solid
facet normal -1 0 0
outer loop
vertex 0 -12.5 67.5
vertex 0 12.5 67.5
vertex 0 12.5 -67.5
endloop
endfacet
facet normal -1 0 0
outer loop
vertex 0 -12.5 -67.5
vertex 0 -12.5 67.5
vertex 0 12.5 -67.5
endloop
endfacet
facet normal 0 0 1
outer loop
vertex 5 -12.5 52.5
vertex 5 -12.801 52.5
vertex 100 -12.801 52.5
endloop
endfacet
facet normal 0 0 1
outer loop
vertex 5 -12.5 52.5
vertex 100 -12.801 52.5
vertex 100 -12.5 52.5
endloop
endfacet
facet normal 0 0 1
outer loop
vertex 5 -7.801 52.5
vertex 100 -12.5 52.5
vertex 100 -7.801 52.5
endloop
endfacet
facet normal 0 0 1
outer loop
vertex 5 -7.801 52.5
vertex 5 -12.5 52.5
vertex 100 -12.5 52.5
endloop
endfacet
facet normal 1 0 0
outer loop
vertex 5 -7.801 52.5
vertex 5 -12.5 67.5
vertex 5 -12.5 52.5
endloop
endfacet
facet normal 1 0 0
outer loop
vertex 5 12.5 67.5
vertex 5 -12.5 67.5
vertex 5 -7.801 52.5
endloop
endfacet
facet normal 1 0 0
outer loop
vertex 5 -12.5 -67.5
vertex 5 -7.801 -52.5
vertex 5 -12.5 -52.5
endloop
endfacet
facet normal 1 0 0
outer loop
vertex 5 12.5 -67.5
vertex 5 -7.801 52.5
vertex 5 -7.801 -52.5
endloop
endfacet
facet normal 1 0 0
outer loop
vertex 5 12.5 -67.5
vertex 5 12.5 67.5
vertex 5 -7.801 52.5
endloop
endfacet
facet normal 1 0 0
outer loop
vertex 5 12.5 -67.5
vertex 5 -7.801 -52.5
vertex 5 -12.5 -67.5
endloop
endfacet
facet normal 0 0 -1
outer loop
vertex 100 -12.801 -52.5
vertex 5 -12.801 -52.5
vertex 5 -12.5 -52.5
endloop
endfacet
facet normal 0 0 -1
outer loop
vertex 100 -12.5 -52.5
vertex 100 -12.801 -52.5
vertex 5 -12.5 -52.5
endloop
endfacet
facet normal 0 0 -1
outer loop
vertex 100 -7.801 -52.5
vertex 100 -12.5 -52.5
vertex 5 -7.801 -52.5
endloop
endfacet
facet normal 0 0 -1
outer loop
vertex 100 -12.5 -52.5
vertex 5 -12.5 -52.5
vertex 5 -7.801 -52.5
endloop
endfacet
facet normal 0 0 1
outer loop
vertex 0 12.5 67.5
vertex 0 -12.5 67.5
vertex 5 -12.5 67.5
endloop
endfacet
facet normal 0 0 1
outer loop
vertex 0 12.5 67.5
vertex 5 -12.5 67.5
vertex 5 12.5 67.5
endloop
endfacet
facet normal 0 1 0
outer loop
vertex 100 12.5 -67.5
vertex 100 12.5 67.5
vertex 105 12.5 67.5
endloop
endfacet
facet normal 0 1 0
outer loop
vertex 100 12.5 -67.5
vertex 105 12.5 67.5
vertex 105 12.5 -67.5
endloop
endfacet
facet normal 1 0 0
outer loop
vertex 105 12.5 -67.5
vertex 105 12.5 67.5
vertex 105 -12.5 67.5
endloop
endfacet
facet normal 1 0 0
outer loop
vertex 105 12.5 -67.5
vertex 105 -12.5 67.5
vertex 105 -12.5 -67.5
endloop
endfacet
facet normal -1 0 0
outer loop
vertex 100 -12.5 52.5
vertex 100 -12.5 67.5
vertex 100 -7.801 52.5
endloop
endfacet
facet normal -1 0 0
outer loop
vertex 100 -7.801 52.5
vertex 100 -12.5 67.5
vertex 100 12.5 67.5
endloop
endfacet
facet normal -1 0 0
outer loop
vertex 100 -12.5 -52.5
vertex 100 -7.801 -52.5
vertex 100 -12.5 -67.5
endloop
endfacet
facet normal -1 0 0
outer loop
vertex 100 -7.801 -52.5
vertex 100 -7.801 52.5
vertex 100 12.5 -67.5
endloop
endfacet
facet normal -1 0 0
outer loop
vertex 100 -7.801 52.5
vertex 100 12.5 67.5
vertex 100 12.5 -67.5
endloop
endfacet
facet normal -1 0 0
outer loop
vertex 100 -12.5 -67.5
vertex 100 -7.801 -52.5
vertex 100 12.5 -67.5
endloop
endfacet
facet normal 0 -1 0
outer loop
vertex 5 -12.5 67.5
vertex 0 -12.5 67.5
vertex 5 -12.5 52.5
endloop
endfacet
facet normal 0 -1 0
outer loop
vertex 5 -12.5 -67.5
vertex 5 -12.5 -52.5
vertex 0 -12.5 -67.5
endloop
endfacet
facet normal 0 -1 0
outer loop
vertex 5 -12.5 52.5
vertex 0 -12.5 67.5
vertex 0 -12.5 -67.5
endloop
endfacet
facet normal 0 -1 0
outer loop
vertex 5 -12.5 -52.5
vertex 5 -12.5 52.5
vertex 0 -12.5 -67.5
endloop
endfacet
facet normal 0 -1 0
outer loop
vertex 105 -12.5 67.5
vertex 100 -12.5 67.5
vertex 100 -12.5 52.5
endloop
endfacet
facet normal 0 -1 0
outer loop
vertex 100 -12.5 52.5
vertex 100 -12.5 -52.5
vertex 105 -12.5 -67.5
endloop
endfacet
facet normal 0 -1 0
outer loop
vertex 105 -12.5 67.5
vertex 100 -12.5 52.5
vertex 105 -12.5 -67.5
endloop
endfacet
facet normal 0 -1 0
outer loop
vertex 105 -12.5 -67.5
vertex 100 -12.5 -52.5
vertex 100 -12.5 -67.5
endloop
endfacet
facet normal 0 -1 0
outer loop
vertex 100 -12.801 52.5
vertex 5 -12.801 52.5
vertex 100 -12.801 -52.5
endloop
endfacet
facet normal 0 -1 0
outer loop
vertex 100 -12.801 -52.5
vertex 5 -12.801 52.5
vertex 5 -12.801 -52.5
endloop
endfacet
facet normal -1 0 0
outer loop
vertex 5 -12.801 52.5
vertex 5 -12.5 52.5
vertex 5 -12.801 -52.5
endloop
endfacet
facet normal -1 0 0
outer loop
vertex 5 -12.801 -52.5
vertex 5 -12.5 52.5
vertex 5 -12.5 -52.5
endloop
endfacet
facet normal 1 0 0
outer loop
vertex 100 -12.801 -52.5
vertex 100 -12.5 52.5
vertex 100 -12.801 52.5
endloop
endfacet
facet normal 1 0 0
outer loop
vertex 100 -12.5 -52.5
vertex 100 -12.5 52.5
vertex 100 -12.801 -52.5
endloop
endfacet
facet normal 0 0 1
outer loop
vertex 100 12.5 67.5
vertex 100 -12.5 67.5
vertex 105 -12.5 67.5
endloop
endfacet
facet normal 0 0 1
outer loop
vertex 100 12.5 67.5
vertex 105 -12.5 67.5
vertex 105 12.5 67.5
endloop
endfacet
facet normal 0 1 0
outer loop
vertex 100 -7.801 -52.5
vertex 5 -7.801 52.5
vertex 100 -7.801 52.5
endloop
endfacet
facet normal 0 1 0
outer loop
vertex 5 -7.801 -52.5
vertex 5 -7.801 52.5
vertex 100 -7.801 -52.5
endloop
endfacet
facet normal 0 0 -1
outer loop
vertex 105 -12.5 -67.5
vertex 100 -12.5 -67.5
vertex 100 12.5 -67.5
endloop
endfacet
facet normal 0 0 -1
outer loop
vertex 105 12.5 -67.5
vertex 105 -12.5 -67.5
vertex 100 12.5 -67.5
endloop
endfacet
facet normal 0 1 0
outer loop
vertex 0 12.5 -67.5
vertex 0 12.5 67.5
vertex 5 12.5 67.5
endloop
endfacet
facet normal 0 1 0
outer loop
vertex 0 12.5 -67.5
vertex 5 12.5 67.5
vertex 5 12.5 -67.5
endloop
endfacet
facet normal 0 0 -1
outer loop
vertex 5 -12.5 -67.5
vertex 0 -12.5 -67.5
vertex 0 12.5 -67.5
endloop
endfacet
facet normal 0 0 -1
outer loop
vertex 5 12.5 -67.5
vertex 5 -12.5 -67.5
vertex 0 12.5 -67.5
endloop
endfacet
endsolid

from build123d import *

# Parameters (mm, degrees)
SKETCH_1_W      = 135
SKETCH_1_H      = 25
EXTRUDE_1_DEPTH = 5
SKETCH_3_W      = 105
SKETCH_3_H      = 5
EXTRUDE_2_DEPTH = 95
SKETCH_4_W      = 135
SKETCH_4_H      = 25
EXTRUDE_3_DEPTH = 5


with BuildPart() as part:
    # 草图1 → 凸台-拉伸1 (new body)
    with BuildSketch(Plane(origin=(0, 0, 0), x_dir=(0, 0, -1), z_dir=(1, 0, 0))):
        Rectangle(SKETCH_1_W, SKETCH_1_H)
    extrude(amount=EXTRUDE_1_DEPTH)

    # 草图3 → 凸台-拉伸2 (add)
    with BuildSketch(Plane(origin=(5, 0, 0), x_dir=(0, 0, -1), z_dir=(1, 0, 0))):
        with Locations((0, -10.300870967)):
            Rectangle(SKETCH_3_W, SKETCH_3_H)
    extrude(amount=EXTRUDE_2_DEPTH)

    # 草图4 → 凸台-拉伸3 (add)
    with BuildSketch(Plane(origin=(100, 0, 0), x_dir=(0, 0, -1), z_dir=(1, 0, 0))):
        Rectangle(SKETCH_4_W, SKETCH_4_H)
    extrude(amount=EXTRUDE_3_DEPTH)


solid = part.part
